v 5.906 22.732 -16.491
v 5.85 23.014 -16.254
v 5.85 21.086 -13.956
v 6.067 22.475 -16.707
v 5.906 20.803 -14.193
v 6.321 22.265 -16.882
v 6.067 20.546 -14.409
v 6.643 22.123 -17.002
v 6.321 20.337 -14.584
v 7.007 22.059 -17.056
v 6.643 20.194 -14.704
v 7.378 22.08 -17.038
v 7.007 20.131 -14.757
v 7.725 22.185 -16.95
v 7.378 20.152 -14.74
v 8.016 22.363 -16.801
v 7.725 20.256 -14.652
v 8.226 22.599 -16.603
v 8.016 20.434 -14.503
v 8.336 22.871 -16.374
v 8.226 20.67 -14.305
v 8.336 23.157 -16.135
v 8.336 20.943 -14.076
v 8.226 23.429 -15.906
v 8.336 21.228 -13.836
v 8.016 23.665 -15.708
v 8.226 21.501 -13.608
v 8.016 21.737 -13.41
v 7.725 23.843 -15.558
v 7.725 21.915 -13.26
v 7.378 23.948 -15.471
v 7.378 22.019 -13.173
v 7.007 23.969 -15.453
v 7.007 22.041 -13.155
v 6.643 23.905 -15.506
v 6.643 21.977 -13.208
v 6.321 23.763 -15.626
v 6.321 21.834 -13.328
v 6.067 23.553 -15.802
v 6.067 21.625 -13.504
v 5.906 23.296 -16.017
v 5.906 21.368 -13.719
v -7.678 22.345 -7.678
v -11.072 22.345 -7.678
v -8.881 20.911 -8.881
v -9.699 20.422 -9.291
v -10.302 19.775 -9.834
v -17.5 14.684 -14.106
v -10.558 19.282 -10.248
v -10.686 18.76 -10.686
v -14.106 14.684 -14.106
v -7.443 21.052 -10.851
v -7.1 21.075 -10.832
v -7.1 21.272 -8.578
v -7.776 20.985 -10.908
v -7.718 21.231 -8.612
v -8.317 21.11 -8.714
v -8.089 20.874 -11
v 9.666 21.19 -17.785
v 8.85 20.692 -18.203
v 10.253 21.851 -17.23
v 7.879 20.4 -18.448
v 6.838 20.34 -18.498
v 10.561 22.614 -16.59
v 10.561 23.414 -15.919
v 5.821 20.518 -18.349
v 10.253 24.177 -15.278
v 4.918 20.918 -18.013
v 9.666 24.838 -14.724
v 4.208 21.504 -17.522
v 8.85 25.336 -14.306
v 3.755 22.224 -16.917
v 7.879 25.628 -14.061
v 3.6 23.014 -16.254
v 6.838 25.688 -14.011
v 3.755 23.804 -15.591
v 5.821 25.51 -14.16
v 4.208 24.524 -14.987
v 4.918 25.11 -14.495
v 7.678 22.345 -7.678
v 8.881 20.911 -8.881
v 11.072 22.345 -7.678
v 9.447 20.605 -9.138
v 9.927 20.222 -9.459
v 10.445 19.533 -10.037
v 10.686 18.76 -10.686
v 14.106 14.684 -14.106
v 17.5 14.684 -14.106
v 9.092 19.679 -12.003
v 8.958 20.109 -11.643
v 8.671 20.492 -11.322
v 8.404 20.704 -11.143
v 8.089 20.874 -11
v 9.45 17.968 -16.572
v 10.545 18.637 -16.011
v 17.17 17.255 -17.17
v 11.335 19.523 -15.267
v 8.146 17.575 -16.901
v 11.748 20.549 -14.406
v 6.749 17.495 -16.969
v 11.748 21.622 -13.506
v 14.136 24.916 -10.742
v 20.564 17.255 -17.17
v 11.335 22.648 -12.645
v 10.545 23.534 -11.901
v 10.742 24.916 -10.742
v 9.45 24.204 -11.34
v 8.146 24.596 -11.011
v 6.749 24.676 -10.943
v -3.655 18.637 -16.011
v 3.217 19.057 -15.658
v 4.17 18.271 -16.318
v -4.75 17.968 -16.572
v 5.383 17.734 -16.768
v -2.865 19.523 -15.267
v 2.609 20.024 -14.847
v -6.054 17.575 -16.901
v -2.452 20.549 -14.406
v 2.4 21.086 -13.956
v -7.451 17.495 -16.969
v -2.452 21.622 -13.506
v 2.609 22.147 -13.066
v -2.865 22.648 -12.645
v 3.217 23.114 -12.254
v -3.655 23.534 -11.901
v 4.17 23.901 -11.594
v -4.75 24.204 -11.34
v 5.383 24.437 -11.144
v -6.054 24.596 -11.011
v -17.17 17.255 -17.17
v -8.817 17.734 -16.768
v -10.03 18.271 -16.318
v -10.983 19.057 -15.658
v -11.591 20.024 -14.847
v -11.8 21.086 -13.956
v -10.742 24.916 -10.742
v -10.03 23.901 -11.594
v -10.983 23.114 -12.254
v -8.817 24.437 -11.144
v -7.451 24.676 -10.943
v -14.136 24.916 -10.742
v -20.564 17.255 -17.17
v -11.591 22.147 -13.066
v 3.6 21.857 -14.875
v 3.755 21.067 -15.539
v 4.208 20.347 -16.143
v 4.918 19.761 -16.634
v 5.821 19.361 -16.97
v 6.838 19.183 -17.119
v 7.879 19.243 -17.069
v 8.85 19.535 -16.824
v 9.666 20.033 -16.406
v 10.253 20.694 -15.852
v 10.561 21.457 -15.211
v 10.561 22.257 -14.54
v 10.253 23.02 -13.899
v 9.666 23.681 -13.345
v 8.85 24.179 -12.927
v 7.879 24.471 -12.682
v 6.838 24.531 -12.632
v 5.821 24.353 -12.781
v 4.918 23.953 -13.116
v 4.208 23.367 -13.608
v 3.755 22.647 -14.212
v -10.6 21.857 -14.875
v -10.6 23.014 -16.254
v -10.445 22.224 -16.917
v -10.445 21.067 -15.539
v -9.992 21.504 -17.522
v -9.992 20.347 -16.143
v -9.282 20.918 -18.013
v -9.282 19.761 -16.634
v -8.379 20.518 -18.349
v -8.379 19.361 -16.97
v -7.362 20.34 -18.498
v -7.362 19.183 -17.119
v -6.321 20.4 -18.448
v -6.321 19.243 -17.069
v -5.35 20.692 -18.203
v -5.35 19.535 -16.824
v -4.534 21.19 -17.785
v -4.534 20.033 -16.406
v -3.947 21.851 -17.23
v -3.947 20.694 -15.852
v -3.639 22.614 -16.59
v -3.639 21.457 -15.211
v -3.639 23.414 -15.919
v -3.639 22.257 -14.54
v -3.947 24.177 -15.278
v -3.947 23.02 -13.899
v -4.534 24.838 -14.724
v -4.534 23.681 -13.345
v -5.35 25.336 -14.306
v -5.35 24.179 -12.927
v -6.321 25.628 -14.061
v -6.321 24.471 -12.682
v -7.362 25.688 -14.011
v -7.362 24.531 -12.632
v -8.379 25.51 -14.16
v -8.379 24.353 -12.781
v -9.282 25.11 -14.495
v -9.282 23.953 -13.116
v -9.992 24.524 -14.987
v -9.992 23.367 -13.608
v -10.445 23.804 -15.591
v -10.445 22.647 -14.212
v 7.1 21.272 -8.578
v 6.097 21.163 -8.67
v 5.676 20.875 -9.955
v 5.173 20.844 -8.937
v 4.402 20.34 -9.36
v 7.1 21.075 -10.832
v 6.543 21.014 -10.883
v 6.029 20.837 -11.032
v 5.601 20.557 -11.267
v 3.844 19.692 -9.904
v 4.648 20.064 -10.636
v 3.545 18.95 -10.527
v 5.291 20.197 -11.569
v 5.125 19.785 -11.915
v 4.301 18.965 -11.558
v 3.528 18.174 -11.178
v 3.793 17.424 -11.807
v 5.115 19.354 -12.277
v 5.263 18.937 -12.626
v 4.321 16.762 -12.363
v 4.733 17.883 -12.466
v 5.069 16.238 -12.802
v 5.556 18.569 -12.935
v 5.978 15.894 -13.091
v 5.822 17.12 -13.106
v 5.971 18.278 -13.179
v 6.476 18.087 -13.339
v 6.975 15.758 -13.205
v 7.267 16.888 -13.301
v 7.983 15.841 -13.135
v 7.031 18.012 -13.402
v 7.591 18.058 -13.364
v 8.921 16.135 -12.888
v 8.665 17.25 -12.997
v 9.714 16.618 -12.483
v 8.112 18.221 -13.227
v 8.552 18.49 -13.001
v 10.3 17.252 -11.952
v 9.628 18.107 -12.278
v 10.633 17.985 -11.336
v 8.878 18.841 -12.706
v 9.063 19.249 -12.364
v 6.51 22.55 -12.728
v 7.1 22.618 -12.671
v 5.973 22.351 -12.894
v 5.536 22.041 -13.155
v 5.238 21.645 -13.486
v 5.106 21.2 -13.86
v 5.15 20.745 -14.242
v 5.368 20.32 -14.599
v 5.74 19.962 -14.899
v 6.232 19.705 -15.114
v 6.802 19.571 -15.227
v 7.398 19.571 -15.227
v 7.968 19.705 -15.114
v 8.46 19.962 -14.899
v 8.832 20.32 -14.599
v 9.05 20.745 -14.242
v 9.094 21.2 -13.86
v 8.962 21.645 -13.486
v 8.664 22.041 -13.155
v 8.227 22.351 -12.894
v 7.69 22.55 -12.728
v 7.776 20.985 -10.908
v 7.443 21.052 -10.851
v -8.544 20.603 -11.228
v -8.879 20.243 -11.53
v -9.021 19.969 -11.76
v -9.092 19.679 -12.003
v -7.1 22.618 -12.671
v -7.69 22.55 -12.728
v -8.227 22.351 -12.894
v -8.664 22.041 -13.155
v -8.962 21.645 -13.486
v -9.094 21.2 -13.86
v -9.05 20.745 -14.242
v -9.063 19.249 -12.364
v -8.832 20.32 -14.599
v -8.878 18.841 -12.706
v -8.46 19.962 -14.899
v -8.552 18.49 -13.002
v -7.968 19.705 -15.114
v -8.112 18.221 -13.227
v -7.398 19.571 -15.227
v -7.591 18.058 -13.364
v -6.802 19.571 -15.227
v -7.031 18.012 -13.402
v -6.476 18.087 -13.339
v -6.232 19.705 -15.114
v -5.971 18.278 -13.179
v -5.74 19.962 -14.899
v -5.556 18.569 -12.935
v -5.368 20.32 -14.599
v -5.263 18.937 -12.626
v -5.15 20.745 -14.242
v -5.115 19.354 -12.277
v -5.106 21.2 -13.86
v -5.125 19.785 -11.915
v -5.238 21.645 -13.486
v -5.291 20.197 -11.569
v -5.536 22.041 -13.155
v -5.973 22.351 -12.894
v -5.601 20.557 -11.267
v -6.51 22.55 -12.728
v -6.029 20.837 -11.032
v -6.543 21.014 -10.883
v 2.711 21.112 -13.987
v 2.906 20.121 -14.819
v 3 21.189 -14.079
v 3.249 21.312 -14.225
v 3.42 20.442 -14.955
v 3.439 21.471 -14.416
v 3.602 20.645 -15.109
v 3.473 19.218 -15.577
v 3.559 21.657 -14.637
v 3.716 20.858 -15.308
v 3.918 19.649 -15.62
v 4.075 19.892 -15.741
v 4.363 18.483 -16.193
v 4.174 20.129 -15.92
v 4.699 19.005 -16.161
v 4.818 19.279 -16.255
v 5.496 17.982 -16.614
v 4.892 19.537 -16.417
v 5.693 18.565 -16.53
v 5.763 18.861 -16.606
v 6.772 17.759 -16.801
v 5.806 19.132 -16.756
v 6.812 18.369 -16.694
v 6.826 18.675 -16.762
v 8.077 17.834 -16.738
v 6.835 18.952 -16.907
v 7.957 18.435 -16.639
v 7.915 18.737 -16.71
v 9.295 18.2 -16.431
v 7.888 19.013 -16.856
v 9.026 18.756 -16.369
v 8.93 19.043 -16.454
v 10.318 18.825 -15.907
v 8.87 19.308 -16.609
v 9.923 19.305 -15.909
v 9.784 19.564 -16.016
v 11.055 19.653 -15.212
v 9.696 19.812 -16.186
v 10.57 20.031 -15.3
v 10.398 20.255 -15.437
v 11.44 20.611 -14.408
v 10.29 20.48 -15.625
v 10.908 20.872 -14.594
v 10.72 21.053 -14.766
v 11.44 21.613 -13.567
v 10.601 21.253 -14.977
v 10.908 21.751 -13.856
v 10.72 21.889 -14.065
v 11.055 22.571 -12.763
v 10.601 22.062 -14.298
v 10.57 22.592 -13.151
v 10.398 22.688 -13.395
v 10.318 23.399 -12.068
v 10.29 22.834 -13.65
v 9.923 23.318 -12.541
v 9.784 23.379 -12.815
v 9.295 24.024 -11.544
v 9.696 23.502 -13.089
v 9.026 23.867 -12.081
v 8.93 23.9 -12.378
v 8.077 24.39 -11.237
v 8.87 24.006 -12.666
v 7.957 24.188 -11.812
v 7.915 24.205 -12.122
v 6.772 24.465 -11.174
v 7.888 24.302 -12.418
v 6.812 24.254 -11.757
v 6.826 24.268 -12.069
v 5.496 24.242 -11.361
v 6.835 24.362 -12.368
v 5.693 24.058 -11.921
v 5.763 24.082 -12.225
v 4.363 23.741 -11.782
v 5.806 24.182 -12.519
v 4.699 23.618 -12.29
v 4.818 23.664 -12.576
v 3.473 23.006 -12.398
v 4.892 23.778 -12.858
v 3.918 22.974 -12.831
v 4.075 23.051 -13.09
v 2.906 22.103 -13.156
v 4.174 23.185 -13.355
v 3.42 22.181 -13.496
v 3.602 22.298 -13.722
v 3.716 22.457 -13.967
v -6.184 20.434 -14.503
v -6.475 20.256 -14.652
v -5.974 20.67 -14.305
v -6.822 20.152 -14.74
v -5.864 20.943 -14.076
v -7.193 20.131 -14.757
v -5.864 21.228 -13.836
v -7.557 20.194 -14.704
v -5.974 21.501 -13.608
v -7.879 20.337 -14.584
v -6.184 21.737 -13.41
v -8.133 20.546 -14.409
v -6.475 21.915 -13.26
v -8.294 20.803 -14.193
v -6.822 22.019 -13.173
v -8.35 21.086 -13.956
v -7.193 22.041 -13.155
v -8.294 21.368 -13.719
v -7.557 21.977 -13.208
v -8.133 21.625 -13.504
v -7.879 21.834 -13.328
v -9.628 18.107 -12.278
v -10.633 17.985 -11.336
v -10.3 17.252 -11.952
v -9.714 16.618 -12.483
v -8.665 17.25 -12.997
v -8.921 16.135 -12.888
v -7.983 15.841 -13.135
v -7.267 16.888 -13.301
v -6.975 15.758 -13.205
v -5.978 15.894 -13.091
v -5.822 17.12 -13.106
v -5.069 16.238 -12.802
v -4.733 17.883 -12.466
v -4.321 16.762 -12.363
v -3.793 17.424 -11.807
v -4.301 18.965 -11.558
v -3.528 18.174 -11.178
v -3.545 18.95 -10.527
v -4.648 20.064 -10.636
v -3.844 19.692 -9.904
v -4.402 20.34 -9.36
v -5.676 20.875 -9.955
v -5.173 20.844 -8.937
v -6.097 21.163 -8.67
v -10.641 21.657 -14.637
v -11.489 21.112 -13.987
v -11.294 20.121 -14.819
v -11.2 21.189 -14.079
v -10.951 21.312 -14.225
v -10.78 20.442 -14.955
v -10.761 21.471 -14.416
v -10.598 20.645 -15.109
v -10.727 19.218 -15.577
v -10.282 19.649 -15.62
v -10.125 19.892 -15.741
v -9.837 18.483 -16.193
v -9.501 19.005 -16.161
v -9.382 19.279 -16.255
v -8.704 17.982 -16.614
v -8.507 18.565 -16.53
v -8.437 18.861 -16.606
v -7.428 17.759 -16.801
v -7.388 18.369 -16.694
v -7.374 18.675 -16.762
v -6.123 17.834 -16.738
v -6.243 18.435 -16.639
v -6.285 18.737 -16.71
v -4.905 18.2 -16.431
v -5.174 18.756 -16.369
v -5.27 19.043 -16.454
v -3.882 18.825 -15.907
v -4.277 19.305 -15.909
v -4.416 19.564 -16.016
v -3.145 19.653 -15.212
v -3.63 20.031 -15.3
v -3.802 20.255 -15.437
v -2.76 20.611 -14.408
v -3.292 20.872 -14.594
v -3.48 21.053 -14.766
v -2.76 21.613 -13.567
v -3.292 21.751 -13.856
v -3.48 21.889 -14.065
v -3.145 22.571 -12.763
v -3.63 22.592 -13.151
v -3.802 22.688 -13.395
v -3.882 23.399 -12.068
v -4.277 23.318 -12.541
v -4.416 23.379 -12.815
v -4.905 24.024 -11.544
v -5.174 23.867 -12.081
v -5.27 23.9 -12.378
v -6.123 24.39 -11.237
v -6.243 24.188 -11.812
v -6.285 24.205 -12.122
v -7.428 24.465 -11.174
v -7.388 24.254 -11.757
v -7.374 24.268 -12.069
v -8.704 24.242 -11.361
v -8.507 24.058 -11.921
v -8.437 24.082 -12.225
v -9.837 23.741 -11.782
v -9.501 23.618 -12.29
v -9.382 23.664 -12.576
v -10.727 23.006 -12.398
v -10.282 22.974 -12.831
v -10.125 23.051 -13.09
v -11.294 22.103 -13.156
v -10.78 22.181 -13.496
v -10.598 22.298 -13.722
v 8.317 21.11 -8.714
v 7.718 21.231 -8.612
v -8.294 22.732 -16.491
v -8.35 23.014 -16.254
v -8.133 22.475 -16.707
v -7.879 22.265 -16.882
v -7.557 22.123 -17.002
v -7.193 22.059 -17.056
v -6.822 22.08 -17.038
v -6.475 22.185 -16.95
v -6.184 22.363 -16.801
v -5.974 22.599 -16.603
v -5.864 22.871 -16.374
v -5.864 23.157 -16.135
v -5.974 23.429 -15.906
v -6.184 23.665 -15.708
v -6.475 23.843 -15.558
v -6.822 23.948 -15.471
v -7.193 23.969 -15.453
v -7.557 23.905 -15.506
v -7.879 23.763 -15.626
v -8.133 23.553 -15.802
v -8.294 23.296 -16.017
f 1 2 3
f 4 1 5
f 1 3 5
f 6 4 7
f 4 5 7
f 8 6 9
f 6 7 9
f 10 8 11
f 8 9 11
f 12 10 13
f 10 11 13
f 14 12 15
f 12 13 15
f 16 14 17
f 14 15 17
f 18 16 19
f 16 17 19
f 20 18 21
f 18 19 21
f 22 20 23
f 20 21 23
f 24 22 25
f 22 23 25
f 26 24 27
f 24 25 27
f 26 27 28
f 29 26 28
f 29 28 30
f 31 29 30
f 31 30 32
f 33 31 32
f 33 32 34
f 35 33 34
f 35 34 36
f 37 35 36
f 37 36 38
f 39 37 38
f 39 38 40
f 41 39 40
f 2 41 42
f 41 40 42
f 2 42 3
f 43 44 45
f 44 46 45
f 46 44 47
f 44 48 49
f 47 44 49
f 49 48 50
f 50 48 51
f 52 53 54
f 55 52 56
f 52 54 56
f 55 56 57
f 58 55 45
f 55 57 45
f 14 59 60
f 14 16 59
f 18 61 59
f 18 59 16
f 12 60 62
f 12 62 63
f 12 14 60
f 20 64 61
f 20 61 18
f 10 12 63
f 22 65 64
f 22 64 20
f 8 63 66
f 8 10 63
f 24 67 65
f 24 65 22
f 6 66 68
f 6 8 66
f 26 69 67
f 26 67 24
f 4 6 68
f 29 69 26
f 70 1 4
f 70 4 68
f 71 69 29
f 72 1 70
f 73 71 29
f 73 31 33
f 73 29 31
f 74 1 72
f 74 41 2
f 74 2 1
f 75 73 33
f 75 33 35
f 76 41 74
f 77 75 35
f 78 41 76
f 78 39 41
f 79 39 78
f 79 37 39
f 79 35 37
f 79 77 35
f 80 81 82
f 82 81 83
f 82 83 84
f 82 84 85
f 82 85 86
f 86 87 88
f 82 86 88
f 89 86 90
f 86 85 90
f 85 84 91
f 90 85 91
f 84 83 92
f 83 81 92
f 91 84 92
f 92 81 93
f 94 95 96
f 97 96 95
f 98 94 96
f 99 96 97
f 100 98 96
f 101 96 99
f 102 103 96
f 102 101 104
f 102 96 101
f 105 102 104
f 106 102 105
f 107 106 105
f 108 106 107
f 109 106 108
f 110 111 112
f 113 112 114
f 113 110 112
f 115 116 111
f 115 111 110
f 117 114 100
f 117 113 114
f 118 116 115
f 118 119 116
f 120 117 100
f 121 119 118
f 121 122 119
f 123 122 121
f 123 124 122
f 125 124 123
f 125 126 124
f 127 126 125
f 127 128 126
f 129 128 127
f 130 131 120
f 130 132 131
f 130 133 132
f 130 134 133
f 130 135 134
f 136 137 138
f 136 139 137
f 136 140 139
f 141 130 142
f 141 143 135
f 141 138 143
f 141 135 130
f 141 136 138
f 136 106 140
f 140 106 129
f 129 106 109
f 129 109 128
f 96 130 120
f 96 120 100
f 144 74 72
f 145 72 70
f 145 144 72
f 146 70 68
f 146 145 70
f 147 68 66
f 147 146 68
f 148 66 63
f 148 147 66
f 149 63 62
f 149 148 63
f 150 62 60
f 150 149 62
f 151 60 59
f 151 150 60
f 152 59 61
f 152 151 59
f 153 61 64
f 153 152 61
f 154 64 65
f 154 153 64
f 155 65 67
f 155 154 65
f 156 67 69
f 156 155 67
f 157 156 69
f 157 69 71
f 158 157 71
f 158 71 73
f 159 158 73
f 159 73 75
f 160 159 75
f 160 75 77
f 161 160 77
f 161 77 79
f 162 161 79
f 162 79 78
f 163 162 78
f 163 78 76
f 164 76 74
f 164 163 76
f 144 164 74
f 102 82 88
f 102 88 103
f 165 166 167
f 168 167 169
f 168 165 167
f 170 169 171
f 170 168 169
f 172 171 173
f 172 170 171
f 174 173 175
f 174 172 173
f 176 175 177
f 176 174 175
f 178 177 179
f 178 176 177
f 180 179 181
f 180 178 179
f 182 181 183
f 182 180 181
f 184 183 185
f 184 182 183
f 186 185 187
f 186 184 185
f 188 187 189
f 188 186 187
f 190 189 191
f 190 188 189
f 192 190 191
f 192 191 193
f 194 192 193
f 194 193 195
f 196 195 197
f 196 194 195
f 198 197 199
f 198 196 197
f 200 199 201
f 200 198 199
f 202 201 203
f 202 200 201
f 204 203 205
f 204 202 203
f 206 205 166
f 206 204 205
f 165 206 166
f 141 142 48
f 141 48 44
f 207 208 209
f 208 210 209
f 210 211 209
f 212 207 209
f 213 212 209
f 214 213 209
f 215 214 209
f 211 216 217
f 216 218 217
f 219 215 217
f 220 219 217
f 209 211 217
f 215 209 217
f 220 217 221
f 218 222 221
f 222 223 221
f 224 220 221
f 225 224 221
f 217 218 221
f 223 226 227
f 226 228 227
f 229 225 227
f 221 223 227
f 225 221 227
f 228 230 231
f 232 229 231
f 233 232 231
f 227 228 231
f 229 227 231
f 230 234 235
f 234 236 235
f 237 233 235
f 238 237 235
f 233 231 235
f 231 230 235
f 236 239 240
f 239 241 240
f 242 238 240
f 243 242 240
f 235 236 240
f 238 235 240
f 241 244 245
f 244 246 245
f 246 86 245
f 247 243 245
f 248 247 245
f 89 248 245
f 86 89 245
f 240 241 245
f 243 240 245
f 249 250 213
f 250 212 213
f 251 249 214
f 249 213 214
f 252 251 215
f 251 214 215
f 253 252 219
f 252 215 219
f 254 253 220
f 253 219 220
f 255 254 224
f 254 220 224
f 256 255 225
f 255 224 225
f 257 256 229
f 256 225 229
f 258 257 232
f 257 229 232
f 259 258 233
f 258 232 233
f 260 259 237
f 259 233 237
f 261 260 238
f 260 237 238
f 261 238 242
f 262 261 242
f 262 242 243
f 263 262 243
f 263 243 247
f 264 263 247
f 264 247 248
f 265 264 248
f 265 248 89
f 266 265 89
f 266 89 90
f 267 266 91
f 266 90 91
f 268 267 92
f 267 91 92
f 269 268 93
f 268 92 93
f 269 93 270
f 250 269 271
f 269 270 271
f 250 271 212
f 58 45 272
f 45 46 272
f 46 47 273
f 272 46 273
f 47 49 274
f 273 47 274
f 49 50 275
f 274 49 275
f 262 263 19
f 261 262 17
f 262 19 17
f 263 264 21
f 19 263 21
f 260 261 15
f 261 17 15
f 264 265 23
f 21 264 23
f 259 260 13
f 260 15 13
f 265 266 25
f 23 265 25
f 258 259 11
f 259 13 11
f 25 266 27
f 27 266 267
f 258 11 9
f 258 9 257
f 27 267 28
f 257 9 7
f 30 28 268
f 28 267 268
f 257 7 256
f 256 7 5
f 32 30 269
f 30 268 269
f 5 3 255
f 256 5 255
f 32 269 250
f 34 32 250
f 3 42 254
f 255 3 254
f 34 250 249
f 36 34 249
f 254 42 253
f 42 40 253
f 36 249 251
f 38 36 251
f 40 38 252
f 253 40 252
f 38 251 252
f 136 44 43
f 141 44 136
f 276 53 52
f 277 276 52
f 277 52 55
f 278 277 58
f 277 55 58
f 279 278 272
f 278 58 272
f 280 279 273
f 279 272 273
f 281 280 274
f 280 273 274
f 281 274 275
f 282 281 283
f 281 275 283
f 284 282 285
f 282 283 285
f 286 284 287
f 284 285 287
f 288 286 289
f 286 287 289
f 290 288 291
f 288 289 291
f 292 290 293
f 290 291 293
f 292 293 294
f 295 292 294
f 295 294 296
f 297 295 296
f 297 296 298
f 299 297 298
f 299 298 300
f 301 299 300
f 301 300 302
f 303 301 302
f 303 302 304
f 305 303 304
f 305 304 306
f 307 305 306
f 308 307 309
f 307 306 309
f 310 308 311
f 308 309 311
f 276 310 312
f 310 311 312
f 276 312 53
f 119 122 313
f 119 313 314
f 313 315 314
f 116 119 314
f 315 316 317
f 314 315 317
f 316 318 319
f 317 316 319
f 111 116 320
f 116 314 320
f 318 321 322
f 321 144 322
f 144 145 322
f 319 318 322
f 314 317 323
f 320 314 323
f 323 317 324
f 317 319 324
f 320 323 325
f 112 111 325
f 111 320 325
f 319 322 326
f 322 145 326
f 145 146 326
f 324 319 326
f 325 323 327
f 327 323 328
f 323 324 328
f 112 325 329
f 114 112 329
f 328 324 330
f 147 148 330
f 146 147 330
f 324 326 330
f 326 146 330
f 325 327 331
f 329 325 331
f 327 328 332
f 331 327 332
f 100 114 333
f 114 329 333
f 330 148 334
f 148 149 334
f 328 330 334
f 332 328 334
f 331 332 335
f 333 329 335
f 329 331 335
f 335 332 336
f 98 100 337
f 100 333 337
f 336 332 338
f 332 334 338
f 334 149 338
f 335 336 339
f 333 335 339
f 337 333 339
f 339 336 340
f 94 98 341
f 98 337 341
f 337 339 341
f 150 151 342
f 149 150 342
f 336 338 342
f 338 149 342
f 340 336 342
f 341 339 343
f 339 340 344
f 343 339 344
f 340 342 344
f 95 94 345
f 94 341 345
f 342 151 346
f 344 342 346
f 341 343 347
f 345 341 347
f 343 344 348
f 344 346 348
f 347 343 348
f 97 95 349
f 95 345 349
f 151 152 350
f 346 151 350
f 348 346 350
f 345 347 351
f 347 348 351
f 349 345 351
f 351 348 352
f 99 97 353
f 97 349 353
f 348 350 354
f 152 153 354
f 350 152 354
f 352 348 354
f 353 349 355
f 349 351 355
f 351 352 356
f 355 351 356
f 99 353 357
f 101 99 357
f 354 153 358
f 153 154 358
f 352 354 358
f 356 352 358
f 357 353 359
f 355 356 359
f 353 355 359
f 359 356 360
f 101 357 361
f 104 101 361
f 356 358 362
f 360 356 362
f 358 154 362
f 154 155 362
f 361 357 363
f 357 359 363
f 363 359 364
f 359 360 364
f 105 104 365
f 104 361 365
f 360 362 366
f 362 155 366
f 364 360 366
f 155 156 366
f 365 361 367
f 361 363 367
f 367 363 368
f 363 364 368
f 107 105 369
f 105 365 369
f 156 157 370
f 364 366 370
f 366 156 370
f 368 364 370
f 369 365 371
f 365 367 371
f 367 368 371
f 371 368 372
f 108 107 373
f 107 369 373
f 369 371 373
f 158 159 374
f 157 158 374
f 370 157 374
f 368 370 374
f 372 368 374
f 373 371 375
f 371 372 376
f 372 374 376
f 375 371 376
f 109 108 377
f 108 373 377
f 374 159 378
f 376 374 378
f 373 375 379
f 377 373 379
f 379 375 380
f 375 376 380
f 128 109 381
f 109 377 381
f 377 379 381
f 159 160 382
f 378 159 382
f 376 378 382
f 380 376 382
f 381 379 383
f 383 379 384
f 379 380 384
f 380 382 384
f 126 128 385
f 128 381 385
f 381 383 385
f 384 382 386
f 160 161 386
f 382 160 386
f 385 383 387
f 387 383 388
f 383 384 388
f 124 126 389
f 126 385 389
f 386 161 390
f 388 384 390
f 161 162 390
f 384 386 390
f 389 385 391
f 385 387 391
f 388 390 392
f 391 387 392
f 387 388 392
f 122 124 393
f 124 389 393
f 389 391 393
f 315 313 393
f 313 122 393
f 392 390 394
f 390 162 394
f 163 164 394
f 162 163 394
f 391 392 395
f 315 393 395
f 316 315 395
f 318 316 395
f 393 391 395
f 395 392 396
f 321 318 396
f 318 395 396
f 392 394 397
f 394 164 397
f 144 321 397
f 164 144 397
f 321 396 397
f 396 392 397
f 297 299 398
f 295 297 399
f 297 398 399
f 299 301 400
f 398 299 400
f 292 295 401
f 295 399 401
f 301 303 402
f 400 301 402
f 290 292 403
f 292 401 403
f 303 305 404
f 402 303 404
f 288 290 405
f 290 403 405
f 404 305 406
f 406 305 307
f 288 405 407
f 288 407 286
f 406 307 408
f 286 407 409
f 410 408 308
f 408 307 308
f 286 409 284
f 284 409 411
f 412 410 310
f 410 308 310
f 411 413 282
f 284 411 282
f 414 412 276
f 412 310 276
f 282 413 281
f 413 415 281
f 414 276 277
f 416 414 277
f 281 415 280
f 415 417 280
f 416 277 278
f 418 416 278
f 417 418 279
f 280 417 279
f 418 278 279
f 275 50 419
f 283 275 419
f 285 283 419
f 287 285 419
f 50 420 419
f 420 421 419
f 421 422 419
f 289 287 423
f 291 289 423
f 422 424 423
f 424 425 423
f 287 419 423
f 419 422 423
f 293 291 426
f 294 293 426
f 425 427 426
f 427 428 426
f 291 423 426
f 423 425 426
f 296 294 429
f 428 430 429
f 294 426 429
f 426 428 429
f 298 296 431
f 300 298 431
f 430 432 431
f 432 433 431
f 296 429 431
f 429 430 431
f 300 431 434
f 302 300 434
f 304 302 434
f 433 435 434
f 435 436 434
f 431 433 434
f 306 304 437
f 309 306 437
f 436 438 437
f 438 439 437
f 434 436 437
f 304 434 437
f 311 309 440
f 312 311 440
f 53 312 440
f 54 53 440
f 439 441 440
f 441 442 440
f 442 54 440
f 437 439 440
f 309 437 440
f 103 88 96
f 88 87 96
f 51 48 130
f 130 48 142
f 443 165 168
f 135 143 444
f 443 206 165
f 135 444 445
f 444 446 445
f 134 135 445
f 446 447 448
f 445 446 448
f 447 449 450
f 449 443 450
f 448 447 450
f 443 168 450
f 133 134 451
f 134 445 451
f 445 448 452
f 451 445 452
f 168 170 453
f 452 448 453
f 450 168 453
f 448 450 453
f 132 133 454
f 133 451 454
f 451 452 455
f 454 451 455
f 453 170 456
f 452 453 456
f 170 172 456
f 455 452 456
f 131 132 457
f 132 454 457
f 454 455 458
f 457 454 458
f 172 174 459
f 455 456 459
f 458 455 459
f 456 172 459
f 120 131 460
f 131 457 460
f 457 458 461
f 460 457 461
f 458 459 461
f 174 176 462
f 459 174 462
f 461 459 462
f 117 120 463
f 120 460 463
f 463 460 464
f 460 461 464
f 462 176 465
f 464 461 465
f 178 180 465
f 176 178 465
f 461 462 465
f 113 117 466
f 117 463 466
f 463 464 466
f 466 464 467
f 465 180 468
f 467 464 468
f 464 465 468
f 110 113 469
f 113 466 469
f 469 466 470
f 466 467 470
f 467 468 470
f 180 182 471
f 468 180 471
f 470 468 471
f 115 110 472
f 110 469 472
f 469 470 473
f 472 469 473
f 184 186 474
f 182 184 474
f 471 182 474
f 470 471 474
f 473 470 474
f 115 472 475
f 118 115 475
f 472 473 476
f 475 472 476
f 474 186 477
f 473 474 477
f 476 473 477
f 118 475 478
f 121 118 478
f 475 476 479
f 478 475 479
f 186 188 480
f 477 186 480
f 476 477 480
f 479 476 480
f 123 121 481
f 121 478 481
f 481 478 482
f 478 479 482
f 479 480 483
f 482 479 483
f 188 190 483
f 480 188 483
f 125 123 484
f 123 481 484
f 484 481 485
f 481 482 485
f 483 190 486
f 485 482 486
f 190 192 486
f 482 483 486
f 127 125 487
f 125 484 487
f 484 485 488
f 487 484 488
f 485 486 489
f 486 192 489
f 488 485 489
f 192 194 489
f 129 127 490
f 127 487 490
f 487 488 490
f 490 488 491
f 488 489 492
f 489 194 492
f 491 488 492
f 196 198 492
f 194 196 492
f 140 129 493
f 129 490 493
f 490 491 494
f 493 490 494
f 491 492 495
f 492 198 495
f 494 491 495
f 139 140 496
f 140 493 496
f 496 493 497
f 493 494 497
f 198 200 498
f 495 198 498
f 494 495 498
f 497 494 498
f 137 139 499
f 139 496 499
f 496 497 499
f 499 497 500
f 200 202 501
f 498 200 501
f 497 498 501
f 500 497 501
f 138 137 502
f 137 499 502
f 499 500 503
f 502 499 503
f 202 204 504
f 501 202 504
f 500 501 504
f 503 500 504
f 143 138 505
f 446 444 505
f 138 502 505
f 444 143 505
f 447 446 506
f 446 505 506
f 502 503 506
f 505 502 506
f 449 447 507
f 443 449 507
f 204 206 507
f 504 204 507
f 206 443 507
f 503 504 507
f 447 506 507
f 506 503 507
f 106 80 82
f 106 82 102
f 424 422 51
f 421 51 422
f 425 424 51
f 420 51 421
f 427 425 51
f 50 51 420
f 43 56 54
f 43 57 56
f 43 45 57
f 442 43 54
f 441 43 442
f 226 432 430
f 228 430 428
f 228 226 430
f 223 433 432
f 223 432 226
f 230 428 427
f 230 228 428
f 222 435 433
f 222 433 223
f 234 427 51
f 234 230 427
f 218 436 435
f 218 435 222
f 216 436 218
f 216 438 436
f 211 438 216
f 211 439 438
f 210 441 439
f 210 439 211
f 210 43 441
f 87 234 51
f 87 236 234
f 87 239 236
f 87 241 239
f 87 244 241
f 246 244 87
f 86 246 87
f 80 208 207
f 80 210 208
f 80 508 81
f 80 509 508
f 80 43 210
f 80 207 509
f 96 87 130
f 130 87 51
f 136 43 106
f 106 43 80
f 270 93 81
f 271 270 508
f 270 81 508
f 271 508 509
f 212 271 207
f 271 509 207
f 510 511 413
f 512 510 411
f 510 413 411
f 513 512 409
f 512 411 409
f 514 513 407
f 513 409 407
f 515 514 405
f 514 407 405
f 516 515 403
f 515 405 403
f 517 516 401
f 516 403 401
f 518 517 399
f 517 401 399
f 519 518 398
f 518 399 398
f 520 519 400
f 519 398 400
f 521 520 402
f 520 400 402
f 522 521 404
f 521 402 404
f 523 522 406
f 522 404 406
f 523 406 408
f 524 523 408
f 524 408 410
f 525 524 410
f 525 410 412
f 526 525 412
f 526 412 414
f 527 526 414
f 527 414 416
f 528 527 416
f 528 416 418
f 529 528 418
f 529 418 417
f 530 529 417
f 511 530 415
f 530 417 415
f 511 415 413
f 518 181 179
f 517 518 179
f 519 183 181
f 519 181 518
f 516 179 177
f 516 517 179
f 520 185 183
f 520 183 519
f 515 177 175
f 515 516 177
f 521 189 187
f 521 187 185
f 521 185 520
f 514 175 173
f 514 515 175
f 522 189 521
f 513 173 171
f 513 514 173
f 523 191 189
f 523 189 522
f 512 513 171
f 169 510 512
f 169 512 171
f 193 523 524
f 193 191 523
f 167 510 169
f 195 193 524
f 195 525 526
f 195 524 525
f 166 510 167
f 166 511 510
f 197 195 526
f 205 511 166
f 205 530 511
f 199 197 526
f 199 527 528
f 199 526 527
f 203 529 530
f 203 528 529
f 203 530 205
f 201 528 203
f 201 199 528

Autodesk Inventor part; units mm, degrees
ref_plane "YZ Plane" through (0, 0, 0) normal (1, 0, 0) x (0, 1, 0)
ref_plane "XZ Plane" through (0, 0, 0) normal (0, 1, 0) x (-1, 0, 0)
sketch "スケッチ1" plane through (0, 0, 0) normal (0, 1, 0) x (-1, 0, 0)
  line L0 (28.2843, -28.2843) -> (0, 0)
  line L1 (0, 0) -> (-28.2843, -28.2843)
  line L2 (29.9813, -26.5872) -> (0, 3.3941)
  line L3 (0, 3.3941) -> (-29.9813, -26.5872)
  line L4 (28.2843, -28.2843) -> (29.9813, -26.5872)
  line L5 (-28.2843, -28.2843) -> (-29.9813, -26.5872)
  dimension "d0" = 40
  dimension "d1" = 2.4
extrude "押し出し1" add sketch "スケッチ1" along normal blind 50
sketch "スケッチ2" plane through (0, 0, 0) normal (1, 0, 0) x (0, 1, 0)
  line L0 (0, 3.3941) -> (31.9749, -34.7121)
  line L1 (0, 0) -> (0, -28.2843) projected
  line L2 (7.6604, 9.822) -> (39.6354, -28.2843)
  line L3 (0, 3.3941) -> (7.6604, 9.822)
  line L4 (39.6354, -28.2843) -> (31.9749, -34.7121)
  line L5 (0, -28.2843) -> (50, -28.2843) projected
  point P0 (26.5813, -28.2843)
  dimension "d4" = 40
  dimension "d5" = 10
extrude "押し出し2" cut sketch "スケッチ2" along normal mid plane 50 contours L3 L2 L5 L0 keep common part
ref_plane "作業平面1" through (0, 9.2239, 0.1802) normal (0, 0.7660444, 0.6427876) x (0.7938448, -0.3908923, 0.4658473)
sketch "スケッチ4" plane through (0, 9.2239, 0.1802) normal (0, 0.7660444, 0.6427876) x (0.7938448, -0.3908923, 0.4658473)
  line L0 (-37.1409, 7.3737) -> (2.5514, 37.7797)
  line L1 (-34.5895, 4.0431) -> (-39.6922, 10.7043) projected
  line L2 (0, 41.1103) -> (5.1027, 34.4491) projected
  point P0 (3.5216, -4.5971)
ref_plane "作業平面2" through (-25, 27.5045, -21.6059) normal (0, -0.6427876, 0.7660444) x (1, 0, 0)
sketch "スケッチ6" plane through (0, 9.2239, 0.1802) normal (0, 0.7660444, 0.6427876) x (0.7938448, -0.3908923, 0.4658473)
  line L0 (5.1027, -6.6611) -> (-34.5895, 4.0431) projected
  line L1 (5.1027, 34.4491) -> (5.1027, -6.6611) projected
  line L2 (5.1027, -6.6611) -> (-22.6818, 0.8318)
  line L3 (-22.6818, 0.8318) -> (5.1027, 22.116)
  line L4 (5.1027, 22.116) -> (5.1027, -6.6611)
  point P0 (3.5216, -4.5971)
  point P1 (5.1027, 22.116)
  dimension "d17" = 35
extrude "押し出し3" cut sketch "スケッチ6" along normal mid plane 50
sketch "スケッチ7" plane through (14.1059, 14.6842, -14.1059) normal (0, -0.6427876, 0.7660444) x (1, 0, 0)
  line L0 (3.3941, 0) -> (0, 0) projected
  line L1 (-3.0338, 10) -> (3.3941, 0) projected
  line L2 (-6.4279, 10) -> (-3.0338, 10) projected
  line L3 (-31.6059, 0) -> (-25.178, 10) projected
  line L4 (-28.2118, 0) -> (-31.6059, 0) projected
  line L5 (-21.7839, 10) -> (-28.2118, 0) projected
  line L6 (-25.178, 10) -> (-21.7839, 10) projected
  line L7 (-21.7839, 10) -> (-6.4279, 10)
  line L8 (-28.2118, 0) -> (0, 0)
  point P0 (-14.1059, -2.1817)
extrude "押し出し4" add sketch "スケッチ7" against normal blind 4
sketch "スケッチ10" plane through (-17.5, 14.6842, -14.1059) normal (0, -0.7660444, -0.6427876) x (1, 0, 0)
  line L0 (34.6701, -4) -> (42.5, -14.2213) projected
  line L1 (42.5, -9.7906) -> (42.5, -14.2213) projected
  line L2 (42.5, -9.7906) -> (35, 0) projected
  line L3 (0, 0) -> (-7.5, -9.7906) projected
  line L4 (-7.5, -14.2213) -> (-7.5, -9.7906) projected
  line L5 (-7.5, -14.2213) -> (0.3299, -4) projected
  line L6 (34.6701, -4) -> (0.3299, -4) projected
  line L7 (54.0058, -4) -> (-14.4099, -4)
  line L8 (-14.4099, -4) -> (-14.4099, -41.5974)
  line L9 (-14.4099, -41.5974) -> (54.0058, -41.5974)
  line L10 (54.0058, -41.5974) -> (54.0058, -4)
  point P0 (17.5, 20.2446)
  point P1 (-3.0642, -4)
  point P2 (38.0642, -4)
  point P3 (34.6701, -4)
extrude "押し出し6" cut sketch "スケッチ10" along normal through all both and the other way through all
sketch "スケッチ5" plane through (-25, 27.5045, -21.6059) normal (0, -0.6427876, 0.7660444) x (1, 0, 0)
  line L0 (0, 0) -> (50, 0) projected
  line L1 (17.9, 0) -> (32.1, 0)
  point P0 (25, -7.1817)
  point P1 (25, 0)
  dimension "d9" = 14.2
hole "穴1" at (-7.1, 27.5045, -21.6059) at (7.1, 27.5045, -21.6059) direction (0, -0.6427876, 0.7660444) diameter 4 end through all
sketch "スケッチ9" plane through (14.1059, 17.2554, -17.1701) normal (0, 0.6427876, -0.7660444) x (-1, 0, 0)
  circle A0 centre (21.2059, 5) radius 2 construction
  circle A1 centre (7.0059, 5) radius 2 construction
  circle A2 centre (7.0059, 5) radius 1.25
  circle A3 centre (7.0059, 5) radius 3.5
  circle A4 centre (21.2059, 5) radius 1.25
  circle A5 centre (21.2059, 5) radius 3.5
  point P0 (14.1059, -2.1817)
  dimension "d22" = 2.5
  dimension "d23" = 1.5
extrude "押し出し5" add sketch "スケッチ9" along normal blind 3
fillet "フィレット1" radius 1.2 2 edges at (-3.6, 21.0856, -13.9561) (10.6, 21.0856, -13.9561)
chamfer "面取り1" distance 1.6 angle 45 2 edges at (7.1, 16.9824, -12.1775) (-7.1, 16.9824, -12.1775)
properties part number "om_Drop_bumper"
